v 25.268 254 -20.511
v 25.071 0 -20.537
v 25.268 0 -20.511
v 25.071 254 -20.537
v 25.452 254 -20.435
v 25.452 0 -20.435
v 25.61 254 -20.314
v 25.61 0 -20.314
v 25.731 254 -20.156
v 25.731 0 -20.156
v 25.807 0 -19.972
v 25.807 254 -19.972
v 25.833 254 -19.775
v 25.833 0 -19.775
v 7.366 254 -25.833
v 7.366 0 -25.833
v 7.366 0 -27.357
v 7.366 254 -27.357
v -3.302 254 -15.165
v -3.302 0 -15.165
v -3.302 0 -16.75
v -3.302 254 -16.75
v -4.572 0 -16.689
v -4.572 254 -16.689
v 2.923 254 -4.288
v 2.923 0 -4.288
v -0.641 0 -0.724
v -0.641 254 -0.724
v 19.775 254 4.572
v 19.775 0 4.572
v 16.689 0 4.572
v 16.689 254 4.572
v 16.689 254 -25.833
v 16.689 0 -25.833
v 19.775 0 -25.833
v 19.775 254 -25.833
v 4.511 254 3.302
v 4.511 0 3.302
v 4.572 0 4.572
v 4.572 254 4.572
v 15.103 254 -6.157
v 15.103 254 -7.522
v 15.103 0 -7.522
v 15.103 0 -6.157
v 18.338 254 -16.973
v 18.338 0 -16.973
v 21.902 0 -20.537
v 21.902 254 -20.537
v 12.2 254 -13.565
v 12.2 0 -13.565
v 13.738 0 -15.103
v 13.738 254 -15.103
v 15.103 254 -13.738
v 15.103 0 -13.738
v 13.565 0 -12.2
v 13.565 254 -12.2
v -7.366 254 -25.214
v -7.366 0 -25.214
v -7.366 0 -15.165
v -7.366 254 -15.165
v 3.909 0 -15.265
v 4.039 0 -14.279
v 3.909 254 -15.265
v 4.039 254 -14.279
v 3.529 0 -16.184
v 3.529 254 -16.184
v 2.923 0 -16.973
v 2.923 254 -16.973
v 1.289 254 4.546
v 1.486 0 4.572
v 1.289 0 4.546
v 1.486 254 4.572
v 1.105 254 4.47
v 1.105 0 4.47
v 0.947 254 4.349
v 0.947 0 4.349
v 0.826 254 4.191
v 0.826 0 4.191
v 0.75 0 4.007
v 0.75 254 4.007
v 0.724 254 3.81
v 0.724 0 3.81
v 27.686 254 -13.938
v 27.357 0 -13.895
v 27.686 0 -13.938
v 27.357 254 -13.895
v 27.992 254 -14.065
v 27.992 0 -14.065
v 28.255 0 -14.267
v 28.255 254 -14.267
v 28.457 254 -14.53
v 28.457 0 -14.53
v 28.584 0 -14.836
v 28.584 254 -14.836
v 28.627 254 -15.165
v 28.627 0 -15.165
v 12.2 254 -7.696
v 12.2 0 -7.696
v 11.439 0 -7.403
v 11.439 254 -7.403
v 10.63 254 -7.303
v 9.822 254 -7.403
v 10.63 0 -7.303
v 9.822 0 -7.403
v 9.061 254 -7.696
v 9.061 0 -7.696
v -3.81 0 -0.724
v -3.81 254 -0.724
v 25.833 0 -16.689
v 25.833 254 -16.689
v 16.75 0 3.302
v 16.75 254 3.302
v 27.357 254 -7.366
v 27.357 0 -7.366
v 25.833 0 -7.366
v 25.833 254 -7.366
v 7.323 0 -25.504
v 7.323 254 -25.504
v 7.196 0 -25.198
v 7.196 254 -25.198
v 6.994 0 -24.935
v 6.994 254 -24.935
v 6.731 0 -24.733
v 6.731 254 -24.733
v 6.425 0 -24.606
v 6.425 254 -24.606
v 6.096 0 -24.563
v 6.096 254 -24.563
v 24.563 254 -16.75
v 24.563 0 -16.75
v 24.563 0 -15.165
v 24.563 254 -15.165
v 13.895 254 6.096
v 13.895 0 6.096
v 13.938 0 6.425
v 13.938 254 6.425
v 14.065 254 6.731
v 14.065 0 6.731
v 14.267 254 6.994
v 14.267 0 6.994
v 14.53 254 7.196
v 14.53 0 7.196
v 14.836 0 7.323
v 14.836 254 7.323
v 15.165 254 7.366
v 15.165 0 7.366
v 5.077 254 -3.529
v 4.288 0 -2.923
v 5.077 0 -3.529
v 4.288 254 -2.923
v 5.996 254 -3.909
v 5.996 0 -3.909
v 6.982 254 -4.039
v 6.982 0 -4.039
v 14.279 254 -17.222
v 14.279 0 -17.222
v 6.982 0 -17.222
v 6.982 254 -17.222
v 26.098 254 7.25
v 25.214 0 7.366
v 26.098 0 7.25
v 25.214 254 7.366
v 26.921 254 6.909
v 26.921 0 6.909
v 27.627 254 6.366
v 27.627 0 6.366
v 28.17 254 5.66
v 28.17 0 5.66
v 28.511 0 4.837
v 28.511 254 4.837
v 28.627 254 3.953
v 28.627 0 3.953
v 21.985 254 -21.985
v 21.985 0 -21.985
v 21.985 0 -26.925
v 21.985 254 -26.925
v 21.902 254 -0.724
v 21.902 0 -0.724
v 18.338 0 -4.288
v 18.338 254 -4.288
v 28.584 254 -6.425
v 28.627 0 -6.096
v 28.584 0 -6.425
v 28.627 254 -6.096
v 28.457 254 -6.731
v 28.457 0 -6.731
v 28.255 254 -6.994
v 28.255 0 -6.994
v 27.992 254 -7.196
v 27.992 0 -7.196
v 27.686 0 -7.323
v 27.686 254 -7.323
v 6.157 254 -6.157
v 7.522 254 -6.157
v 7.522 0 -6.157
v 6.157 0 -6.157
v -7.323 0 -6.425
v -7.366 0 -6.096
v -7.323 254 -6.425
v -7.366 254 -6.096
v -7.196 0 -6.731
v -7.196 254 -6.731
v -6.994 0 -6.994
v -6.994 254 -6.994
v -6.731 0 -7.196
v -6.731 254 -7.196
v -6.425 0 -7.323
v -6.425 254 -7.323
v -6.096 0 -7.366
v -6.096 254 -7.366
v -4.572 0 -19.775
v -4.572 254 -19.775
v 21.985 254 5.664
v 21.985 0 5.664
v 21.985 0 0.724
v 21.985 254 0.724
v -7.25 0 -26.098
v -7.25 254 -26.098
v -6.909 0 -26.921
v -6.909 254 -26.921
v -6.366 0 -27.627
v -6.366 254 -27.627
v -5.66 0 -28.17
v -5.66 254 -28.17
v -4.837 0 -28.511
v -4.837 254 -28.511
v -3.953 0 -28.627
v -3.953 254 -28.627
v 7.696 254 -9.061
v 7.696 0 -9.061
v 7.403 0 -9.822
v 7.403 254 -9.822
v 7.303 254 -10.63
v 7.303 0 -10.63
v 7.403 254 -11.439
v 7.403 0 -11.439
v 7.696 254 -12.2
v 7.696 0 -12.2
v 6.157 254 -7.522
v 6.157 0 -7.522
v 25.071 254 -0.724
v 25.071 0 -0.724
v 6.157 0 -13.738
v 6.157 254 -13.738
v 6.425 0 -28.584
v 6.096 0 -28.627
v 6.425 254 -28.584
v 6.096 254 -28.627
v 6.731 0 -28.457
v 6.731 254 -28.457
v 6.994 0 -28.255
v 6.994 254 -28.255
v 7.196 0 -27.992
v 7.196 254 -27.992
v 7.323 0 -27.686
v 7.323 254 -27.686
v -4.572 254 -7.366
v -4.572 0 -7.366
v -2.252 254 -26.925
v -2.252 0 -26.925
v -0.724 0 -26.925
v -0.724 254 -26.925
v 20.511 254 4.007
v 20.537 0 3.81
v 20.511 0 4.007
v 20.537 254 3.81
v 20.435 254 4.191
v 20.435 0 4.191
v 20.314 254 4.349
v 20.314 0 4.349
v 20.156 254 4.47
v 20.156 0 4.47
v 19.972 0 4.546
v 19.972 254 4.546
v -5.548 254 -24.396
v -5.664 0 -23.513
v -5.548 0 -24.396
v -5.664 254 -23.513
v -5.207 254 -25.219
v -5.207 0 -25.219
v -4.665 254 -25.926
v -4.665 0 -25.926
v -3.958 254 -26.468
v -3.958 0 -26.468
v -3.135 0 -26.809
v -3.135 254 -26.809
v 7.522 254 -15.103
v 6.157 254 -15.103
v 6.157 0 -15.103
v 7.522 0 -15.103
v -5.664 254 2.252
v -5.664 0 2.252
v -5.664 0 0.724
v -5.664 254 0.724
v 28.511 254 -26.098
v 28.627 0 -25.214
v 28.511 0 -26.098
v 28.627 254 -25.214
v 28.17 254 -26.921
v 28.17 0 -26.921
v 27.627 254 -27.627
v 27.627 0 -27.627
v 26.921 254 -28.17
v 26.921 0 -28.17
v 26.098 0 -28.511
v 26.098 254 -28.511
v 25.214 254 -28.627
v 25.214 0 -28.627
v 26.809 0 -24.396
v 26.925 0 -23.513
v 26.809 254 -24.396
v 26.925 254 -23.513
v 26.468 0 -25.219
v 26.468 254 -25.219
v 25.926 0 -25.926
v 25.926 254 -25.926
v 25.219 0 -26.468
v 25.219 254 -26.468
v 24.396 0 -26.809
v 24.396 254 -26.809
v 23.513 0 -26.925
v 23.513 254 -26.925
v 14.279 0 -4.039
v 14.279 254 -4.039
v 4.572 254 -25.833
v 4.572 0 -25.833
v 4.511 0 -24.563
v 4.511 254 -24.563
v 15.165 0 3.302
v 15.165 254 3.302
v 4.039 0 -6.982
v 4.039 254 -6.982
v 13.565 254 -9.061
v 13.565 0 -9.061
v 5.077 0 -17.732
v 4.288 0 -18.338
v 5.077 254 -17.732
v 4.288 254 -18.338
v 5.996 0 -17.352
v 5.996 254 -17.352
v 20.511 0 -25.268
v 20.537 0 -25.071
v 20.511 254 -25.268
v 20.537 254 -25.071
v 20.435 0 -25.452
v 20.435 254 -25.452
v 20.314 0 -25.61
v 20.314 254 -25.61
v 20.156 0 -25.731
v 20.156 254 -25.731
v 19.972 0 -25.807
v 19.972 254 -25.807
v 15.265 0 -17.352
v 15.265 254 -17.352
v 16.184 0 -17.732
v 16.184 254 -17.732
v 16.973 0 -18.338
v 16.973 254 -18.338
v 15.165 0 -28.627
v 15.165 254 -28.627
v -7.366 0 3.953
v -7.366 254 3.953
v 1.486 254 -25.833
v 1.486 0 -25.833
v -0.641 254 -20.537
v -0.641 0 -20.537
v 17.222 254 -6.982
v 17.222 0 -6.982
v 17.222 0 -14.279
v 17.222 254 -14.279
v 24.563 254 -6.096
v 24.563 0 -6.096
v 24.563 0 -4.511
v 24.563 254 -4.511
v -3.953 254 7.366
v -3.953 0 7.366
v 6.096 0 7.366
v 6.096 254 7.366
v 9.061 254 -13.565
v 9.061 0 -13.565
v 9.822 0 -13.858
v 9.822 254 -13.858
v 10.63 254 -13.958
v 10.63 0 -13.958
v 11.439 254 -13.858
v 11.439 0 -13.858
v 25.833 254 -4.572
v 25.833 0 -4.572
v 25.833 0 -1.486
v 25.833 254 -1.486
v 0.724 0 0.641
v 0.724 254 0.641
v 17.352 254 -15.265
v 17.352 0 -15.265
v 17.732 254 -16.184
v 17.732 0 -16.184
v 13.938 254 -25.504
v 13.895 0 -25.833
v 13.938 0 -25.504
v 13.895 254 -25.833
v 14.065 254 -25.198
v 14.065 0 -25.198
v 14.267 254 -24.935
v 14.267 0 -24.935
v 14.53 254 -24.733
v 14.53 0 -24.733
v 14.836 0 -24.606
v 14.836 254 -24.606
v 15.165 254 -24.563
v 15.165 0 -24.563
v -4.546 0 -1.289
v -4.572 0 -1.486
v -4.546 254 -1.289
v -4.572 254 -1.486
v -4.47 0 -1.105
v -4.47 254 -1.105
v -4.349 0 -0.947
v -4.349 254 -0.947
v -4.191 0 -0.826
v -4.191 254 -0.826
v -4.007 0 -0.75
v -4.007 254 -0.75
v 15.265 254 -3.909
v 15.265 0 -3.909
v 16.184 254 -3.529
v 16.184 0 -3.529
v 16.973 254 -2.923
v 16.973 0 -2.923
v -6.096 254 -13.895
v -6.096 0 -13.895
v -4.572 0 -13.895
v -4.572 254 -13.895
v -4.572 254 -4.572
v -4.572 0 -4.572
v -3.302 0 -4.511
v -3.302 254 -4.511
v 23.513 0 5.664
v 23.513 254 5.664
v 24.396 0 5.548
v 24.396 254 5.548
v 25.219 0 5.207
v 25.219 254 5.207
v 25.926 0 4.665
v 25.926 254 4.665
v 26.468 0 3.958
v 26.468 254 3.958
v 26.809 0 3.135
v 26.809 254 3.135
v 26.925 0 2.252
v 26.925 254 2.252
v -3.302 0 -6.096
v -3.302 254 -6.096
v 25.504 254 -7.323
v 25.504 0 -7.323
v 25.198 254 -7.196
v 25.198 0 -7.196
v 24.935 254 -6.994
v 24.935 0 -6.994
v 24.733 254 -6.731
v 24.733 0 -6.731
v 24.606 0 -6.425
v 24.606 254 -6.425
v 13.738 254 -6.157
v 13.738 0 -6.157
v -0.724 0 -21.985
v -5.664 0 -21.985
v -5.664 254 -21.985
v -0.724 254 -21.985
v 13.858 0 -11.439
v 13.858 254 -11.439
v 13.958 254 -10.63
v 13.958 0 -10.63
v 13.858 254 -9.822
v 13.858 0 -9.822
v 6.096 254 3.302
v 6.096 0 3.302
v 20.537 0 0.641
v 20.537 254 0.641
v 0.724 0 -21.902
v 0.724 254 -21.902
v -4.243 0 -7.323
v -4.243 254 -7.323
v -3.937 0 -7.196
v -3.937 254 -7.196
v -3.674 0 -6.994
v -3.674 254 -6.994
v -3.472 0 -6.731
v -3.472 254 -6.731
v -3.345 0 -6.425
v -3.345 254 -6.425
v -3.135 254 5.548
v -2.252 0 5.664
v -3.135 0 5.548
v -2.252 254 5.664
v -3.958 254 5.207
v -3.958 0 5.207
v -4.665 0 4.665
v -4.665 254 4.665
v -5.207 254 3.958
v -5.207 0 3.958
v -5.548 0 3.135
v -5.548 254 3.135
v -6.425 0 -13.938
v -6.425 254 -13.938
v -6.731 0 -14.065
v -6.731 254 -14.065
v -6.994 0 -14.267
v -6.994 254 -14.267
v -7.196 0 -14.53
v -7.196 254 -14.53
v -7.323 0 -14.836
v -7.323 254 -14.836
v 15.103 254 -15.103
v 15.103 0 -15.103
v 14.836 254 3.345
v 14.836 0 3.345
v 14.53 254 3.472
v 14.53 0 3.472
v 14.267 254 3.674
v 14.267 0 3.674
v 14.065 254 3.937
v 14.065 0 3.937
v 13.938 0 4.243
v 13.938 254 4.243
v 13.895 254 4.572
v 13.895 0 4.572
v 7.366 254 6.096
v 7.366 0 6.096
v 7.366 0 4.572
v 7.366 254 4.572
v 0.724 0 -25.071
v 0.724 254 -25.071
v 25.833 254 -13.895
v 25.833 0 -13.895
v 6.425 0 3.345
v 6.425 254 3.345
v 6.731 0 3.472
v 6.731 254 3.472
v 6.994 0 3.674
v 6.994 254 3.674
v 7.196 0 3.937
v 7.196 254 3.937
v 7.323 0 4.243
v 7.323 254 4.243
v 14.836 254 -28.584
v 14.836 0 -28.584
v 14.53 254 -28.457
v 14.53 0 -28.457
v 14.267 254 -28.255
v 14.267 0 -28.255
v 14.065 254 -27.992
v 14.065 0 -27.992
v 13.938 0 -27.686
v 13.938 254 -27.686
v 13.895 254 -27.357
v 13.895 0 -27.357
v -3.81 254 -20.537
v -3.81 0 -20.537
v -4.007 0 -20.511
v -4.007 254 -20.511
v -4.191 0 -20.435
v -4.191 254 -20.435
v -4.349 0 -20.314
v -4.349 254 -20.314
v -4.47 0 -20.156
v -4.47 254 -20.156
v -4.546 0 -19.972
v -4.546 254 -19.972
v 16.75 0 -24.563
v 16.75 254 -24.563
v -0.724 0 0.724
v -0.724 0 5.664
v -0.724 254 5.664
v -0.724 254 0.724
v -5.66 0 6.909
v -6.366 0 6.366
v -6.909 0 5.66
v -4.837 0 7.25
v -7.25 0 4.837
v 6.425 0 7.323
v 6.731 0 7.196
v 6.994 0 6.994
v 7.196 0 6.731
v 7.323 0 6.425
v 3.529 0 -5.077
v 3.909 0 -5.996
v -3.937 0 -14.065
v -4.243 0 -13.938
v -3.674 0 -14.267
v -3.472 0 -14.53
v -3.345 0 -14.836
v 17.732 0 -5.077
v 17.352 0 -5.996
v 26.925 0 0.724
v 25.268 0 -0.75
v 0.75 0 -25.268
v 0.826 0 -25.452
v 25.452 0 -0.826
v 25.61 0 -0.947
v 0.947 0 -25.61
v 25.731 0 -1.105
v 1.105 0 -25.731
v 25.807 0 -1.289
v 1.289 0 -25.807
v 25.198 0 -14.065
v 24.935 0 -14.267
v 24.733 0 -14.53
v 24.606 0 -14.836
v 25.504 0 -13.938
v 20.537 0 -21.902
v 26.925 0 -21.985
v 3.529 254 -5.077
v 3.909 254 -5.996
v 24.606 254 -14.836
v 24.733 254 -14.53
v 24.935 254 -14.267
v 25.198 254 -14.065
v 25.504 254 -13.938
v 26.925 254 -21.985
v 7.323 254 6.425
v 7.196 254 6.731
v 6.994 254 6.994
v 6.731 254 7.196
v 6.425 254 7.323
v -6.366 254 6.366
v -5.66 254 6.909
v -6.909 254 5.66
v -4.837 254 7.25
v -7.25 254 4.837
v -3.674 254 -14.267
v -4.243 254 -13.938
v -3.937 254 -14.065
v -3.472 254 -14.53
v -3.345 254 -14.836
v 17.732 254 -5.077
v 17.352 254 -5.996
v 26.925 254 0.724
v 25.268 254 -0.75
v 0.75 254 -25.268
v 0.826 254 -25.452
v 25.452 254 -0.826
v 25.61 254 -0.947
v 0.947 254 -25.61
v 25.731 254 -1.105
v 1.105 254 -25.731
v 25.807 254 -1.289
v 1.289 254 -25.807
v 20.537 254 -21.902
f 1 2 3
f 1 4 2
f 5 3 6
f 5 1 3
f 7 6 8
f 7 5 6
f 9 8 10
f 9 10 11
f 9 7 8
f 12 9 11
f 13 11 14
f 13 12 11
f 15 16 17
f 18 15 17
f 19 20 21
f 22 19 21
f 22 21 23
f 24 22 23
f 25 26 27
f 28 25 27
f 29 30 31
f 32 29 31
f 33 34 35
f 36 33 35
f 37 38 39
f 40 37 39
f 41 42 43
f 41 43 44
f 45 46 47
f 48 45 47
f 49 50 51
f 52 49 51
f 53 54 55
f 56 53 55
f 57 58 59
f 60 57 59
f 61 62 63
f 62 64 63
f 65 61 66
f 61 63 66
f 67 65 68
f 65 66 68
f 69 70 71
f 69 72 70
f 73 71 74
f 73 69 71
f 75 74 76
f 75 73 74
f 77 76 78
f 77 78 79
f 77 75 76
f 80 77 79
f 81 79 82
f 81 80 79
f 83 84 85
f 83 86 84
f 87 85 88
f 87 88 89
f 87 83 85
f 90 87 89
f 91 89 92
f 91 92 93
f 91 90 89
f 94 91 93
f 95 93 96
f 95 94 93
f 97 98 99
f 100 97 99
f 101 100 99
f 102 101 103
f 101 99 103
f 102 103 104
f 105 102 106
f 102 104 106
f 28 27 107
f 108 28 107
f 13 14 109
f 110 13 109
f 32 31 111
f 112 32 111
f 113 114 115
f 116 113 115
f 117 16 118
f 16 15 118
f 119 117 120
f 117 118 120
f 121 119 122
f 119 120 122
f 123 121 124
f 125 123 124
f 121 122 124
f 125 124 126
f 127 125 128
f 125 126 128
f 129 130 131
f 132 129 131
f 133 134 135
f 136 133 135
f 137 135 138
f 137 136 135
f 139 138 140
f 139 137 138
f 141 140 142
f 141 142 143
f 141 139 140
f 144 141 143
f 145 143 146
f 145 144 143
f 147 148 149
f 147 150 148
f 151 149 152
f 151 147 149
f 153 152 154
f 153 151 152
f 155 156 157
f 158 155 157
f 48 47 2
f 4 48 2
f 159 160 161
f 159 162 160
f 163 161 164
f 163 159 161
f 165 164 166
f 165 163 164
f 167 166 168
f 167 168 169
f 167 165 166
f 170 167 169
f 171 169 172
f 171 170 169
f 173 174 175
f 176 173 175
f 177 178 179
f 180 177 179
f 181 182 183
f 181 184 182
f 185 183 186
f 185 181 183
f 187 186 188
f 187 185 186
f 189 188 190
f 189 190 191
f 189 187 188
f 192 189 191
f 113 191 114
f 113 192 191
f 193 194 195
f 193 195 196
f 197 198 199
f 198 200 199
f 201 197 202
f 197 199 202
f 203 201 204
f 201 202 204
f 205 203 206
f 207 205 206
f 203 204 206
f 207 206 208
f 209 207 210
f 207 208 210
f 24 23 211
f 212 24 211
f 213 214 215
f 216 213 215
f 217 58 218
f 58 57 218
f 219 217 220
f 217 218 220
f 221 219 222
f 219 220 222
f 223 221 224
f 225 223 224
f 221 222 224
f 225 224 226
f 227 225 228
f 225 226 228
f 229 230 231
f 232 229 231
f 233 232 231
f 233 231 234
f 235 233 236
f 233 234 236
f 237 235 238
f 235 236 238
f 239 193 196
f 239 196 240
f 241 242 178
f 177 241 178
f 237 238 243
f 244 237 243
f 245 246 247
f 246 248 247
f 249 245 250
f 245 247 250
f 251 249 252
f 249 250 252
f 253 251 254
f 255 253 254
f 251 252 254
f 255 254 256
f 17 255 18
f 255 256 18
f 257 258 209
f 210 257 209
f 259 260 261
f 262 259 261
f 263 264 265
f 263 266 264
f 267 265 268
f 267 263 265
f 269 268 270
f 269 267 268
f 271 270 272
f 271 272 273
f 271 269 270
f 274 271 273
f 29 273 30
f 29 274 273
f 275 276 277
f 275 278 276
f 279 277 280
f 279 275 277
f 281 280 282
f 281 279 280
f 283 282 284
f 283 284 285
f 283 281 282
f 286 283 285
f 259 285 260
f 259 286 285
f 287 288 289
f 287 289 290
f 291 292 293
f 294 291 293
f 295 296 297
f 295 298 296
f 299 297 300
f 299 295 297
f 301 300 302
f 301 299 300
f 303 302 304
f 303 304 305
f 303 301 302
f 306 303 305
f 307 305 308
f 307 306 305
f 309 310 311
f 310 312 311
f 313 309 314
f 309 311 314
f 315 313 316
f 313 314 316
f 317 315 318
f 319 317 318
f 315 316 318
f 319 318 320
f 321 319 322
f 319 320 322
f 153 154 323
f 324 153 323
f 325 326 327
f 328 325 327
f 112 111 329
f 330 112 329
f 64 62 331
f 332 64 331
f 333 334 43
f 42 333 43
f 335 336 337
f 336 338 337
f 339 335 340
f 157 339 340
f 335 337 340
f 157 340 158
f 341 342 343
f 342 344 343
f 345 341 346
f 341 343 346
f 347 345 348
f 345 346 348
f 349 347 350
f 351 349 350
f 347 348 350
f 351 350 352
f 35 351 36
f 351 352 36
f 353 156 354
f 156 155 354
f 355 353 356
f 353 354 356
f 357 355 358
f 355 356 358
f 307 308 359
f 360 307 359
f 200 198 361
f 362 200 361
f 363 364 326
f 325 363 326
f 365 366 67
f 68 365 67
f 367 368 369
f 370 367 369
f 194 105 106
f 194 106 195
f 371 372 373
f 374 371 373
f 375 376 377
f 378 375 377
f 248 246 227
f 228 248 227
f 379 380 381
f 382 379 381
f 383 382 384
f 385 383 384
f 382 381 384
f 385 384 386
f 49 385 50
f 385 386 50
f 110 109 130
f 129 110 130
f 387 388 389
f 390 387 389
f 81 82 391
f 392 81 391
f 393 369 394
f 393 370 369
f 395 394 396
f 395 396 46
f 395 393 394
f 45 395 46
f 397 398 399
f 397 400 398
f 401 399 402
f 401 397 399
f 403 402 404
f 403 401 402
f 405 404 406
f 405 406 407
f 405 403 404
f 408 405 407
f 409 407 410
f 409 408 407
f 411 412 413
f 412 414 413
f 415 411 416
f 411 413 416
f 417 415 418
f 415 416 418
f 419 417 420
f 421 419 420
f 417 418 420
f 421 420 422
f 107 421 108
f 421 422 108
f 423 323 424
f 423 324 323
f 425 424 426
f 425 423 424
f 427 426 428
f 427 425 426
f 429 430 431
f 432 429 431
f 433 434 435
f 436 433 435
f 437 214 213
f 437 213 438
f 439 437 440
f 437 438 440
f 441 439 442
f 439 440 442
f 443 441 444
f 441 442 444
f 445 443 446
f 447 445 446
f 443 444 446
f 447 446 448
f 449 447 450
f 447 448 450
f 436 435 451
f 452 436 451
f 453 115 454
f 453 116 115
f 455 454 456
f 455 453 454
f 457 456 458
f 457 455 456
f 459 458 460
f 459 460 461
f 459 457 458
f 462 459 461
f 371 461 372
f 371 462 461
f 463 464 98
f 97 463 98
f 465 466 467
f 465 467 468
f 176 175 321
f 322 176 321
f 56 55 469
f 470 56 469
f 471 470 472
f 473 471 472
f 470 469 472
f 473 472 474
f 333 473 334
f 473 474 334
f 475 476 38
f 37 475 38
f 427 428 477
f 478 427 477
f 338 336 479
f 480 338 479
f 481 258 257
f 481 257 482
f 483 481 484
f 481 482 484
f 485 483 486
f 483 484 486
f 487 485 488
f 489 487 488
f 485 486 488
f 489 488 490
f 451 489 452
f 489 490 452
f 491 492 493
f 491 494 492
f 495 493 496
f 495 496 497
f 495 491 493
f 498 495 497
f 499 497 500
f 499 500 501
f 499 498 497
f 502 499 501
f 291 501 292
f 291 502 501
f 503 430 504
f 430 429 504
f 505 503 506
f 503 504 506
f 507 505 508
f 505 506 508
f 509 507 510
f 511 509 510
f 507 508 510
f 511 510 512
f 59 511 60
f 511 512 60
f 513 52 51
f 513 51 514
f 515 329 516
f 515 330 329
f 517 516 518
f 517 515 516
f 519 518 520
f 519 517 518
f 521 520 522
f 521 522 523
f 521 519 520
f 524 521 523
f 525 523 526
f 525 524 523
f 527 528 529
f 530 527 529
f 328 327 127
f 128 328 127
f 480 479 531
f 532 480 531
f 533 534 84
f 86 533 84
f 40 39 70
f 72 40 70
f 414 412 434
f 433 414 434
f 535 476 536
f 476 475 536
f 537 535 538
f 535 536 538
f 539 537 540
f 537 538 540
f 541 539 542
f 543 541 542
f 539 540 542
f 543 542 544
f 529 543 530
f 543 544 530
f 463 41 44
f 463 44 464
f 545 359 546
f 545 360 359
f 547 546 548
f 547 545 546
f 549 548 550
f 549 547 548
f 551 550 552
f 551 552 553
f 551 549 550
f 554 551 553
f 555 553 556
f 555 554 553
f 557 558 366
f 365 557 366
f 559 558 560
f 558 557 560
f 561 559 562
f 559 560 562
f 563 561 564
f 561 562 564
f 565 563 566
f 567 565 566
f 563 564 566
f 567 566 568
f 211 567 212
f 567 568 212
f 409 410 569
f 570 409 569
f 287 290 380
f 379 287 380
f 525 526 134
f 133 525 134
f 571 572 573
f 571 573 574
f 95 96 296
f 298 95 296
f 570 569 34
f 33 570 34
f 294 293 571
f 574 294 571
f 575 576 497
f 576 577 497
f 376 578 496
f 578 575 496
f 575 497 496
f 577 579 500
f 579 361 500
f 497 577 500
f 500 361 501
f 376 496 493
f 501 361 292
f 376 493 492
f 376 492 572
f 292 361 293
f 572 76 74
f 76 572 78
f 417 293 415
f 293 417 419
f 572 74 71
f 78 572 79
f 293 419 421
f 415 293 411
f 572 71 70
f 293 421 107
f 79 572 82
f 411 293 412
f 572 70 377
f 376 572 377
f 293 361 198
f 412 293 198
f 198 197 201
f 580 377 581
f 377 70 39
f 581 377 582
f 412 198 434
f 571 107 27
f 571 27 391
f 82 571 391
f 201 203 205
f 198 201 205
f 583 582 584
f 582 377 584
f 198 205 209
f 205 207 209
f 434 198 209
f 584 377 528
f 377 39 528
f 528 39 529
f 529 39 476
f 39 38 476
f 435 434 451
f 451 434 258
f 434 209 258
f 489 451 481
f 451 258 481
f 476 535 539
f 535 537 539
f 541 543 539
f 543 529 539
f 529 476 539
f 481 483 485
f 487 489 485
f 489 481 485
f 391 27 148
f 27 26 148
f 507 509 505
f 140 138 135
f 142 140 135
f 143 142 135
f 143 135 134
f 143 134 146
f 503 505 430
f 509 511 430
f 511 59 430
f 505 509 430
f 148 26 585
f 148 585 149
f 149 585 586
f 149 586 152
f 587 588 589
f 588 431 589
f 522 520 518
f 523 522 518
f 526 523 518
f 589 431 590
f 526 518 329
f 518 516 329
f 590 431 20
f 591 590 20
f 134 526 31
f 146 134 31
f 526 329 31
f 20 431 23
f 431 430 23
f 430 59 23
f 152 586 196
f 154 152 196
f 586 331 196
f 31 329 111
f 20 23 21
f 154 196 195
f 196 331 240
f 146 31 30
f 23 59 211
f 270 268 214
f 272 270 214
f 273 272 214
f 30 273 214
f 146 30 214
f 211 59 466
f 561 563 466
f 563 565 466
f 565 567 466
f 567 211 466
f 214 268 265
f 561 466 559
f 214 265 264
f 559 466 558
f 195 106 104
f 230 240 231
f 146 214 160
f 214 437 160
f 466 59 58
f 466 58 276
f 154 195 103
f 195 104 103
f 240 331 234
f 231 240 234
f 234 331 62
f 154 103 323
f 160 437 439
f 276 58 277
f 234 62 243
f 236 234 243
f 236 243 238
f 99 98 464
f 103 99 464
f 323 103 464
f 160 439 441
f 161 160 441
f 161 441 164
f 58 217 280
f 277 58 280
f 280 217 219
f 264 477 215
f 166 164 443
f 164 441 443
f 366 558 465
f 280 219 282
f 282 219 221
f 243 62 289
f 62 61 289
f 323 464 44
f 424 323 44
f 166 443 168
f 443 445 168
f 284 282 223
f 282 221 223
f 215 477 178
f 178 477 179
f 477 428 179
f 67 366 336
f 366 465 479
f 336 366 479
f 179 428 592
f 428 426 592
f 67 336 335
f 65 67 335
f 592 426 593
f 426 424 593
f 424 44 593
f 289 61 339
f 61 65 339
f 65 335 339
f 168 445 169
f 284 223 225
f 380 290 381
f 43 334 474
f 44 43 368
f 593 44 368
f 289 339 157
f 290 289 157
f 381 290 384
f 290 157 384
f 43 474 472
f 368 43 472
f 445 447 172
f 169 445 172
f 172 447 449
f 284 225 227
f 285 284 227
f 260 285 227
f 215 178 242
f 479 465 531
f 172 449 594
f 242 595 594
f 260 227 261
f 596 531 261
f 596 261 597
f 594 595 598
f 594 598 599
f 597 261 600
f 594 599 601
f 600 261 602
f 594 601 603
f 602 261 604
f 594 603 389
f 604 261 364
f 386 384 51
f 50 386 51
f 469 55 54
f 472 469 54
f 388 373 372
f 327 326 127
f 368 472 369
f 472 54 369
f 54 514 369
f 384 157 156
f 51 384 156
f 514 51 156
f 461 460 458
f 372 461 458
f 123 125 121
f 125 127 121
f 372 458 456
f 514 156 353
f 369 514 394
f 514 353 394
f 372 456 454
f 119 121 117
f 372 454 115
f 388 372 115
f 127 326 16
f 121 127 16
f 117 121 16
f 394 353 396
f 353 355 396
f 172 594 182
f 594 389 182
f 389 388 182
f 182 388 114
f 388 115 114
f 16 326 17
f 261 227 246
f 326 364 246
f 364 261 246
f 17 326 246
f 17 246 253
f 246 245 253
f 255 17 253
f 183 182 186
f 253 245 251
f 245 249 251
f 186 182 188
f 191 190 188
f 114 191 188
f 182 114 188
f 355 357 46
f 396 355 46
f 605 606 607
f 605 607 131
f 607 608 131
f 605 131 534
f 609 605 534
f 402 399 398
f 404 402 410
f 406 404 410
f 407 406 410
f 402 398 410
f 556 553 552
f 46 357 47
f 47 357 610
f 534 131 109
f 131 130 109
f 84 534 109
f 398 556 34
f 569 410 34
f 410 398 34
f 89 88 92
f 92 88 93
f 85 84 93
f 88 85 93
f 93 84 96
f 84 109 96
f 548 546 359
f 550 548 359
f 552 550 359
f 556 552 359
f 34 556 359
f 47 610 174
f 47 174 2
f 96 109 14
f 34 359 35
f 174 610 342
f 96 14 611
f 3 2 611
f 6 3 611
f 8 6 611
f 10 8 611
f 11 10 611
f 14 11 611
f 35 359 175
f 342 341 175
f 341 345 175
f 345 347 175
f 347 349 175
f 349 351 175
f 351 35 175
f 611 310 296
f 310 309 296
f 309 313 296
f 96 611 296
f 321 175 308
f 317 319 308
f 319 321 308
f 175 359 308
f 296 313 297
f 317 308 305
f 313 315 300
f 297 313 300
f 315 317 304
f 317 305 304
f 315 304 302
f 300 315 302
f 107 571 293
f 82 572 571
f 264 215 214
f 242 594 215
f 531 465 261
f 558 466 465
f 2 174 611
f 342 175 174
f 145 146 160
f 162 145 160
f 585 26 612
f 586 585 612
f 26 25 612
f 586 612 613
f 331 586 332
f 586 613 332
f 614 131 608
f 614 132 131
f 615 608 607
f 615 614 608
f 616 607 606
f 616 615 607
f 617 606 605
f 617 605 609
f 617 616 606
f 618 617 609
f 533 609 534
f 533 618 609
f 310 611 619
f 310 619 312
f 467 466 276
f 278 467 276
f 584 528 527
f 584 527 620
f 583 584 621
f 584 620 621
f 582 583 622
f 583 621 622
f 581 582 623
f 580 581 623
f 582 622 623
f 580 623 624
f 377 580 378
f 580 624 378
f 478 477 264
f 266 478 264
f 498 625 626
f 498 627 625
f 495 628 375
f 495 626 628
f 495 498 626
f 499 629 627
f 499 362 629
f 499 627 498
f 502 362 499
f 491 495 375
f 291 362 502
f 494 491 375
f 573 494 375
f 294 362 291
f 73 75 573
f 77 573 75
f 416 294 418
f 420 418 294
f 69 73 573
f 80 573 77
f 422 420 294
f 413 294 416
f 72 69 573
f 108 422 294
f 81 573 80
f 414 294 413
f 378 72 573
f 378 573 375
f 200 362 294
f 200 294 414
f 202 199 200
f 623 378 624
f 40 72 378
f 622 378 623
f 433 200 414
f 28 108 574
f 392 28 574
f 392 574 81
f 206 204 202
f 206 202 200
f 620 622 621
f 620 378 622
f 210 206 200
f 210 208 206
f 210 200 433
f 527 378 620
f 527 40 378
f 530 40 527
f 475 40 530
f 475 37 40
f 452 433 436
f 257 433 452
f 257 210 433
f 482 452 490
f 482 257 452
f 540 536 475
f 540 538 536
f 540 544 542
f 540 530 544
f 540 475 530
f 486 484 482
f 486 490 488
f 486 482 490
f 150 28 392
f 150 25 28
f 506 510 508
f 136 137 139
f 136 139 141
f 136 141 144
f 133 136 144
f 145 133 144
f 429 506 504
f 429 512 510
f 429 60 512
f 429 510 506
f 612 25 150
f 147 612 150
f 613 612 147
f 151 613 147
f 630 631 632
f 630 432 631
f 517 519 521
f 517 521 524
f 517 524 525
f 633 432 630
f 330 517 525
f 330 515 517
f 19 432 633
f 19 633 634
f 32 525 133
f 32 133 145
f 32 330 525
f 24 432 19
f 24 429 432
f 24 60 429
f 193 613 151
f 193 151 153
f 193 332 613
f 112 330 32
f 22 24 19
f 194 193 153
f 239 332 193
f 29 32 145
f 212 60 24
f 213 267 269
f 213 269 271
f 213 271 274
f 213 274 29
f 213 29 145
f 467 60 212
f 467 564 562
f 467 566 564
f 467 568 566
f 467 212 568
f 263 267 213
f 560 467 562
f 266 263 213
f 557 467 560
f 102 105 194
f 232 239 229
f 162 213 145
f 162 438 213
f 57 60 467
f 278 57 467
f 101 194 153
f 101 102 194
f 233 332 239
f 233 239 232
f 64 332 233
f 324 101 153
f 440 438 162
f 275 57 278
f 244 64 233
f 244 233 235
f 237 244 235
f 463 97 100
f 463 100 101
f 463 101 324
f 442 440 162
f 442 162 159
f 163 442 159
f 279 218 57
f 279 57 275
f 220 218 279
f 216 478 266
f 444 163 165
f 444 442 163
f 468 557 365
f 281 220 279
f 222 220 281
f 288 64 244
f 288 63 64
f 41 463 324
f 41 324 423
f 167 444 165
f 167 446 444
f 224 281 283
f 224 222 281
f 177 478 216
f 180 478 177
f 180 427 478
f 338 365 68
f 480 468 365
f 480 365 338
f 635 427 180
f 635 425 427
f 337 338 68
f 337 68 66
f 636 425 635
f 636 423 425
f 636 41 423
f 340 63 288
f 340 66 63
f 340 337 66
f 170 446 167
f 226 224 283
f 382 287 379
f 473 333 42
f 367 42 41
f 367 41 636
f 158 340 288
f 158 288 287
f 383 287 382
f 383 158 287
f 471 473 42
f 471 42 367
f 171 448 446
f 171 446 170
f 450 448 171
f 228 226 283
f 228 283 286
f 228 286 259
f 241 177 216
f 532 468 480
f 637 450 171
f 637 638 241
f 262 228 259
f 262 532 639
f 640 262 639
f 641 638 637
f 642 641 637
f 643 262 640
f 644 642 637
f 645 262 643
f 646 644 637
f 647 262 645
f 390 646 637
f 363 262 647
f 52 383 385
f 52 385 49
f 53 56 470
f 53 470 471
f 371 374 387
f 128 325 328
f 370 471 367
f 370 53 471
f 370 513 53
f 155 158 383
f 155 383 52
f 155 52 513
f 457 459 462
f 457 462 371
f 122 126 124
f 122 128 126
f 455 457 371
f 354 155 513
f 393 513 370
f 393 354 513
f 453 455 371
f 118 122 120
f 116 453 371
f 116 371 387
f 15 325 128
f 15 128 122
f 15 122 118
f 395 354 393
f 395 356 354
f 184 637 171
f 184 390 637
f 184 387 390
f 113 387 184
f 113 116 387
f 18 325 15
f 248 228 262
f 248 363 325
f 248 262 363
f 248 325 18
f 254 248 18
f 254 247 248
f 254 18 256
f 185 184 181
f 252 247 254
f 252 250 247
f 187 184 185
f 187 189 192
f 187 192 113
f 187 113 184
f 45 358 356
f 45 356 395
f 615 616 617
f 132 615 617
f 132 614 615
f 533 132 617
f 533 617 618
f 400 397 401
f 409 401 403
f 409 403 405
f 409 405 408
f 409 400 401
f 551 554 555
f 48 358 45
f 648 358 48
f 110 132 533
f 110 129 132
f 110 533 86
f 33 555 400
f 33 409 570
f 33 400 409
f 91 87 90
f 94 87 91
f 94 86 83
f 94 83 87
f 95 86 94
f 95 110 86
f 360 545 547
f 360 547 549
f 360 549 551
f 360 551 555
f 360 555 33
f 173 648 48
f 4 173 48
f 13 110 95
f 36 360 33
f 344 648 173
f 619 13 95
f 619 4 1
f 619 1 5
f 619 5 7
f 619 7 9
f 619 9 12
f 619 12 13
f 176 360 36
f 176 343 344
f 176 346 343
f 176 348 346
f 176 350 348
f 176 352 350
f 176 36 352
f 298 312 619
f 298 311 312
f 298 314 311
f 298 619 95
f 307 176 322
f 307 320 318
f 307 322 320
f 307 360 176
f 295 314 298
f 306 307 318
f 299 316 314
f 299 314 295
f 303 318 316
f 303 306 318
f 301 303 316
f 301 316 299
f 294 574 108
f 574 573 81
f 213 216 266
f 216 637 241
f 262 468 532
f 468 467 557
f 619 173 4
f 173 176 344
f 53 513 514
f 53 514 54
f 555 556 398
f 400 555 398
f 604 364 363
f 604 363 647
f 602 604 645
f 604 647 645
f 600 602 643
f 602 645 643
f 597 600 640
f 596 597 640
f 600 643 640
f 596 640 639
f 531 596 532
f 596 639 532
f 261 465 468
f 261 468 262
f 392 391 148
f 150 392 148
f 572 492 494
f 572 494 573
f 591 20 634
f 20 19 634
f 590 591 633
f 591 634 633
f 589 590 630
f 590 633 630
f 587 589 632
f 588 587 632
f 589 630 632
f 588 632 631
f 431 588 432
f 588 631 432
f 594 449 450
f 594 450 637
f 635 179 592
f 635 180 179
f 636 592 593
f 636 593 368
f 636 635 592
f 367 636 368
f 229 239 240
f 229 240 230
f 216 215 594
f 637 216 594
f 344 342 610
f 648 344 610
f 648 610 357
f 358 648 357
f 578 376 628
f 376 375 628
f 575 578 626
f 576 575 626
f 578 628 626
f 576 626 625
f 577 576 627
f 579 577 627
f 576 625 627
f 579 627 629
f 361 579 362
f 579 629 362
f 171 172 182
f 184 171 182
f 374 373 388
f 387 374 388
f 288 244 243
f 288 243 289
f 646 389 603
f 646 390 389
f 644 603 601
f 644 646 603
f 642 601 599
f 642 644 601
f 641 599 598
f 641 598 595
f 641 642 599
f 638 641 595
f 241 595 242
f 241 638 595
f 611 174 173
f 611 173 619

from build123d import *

# Parameters (mm, degrees)
SKETCH1_W           = 4.9403
SKETCH1_H           = 4.9403
BOSS_EXTRUDE6_DEPTH = 254
FILLET1_R           = 3.4125154
FILLET2_R           = 0.762
FILLET3_R           = 1.27
FILLET4_R           = 3.81


with BuildPart() as part:
    # Sketch1 → Boss-Extrude6 (new body)
    with BuildSketch(Plane(origin=(0, 0, 0), x_dir=(1, 0, 0), z_dir=(0, 1, 0))):
        Polygon((-7.366, -7.366), (7.366, -7.366), (7.366, -3.302), (4.510882512, -3.302), (4.572, -4.572), (0.7239, -4.572), (0.7239, -0.64109893), (5.404132197, 4.039133267), (15.856734336, 4.039133267), (20.536966533, -0.64109893), (20.536966533, -4.572), (16.688866533, -4.572), (16.749984021, -3.302), (13.894866533, -3.302), (13.894866533, -7.366), (28.626866533, -7.366), (28.626866533, 7.366), (24.562866533, 7.366), (24.562866533, 4.510882512), (25.832866533, 4.572), (25.832866533, 0.7239), (21.901965464, 0.7239), (17.221733267, 5.404132197), (17.221733267, 15.856734336), (21.901965464, 20.536966533), (25.832866533, 20.536966533), (25.832866533, 16.688866533), (24.562866533, 16.749984021), (24.562866533, 13.894866533), (28.626866533, 13.894866533), (28.626866533, 28.626866533), (13.894866533, 28.626866533), (13.894866533, 24.562866533), (16.749984021, 24.562866533), (16.688866533, 25.832866533), (20.536966533, 25.832866533), (20.536966533, 21.901965464), (15.856734336, 17.221733267), (5.404132197, 17.221733267), (0.7239, 21.901965464), (0.7239, 25.832866533), (4.572, 25.832866533), (4.510882512, 24.562866533), (7.366, 24.562866533), (7.366, 28.626866533), (-7.366, 28.626866533), (-7.366, 13.894866533), (-3.302, 13.894866533), (-3.302, 16.749984021), (-4.572, 16.688866533), (-4.572, 20.536966533), (-0.64109893, 20.536966533), (4.039133267, 15.856734336), (4.039133267, 5.404132197), (-0.64109893, 0.7239), (-4.572, 0.7239), (-4.572, 4.572), (-3.302, 4.510882512), (-3.302, 7.366), (-7.366, 7.366), align=None)
        with Locations((-3.19405, -3.19405)):
            Rectangle(SKETCH1_W, SKETCH1_H, mode=Mode.SUBTRACT)
        with Locations((-3.19405, 24.454916533)):
            Rectangle(SKETCH1_W, SKETCH1_H, mode=Mode.SUBTRACT)
        with Locations((24.454916533, 24.454916533)):
            Rectangle(SKETCH1_W, SKETCH1_H, mode=Mode.SUBTRACT)
        with Locations((24.454916533, -3.19405)):
            Rectangle(SKETCH1_W, SKETCH1_H, mode=Mode.SUBTRACT)
        with BuildLine():
            Line((7.696270003, 12.1995976), (6.157493267, 13.738374336))
            Line((6.157493267, 13.738374336), (6.157493267, 15.103373267))
            Line((6.157493267, 15.103373267), (7.522492197, 15.103373267))
            Line((7.522492197, 15.103373267), (9.061268934, 13.56459653))
            ThreePointArc((9.061268934, 13.56459653), (10.630433267, 13.957833267), (12.1995976, 13.56459653))
            Line((12.1995976, 13.56459653), (13.738374336, 15.103373267))
            Line((13.738374336, 15.103373267), (15.103373267, 15.103373267))
            Line((15.103373267, 15.103373267), (15.103373267, 13.738374336))
            Line((15.103373267, 13.738374336), (13.56459653, 12.1995976))
            ThreePointArc((13.56459653, 12.1995976), (13.957833267, 10.630433267), (13.56459653, 9.061268934))
            Line((13.56459653, 9.061268934), (15.103373267, 7.522492197))
            Line((15.103373267, 7.522492197), (15.103373267, 6.157493267))
            Line((15.103373267, 6.157493267), (13.738374336, 6.157493267))
            Line((13.738374336, 6.157493267), (12.1995976, 7.696270003))
            ThreePointArc((12.1995976, 7.696270003), (10.630433267, 7.303033267), (9.061268934, 7.696270003))
            Line((9.061268934, 7.696270003), (7.522492197, 6.157493267))
            Line((7.522492197, 6.157493267), (6.157493267, 6.157493267))
            Line((6.157493267, 6.157493267), (6.157493267, 7.522492197))
            Line((6.157493267, 7.522492197), (7.696270003, 9.061268934))
            ThreePointArc((7.696270003, 9.061268934), (7.303033267, 10.630433267), (7.696270003, 12.1995976))
        make_face(mode=Mode.SUBTRACT)
    extrude(amount=BOSS_EXTRUDE6_DEPTH)

    # Fillet1
    fillet1_edges = [part.edges().sort_by_distance(p)[0] for p in [
        (-7.366, 127, 7.366),
        (-7.366, 127, -28.626866533),
        (28.626866533, 127, -28.626866533),
        (28.626866533, 127, 7.366),
        (26.925066533, 127, 5.6642),
        (26.925066533, 127, -26.925066533),
        (-5.6642, 127, -26.925066533),
        (-5.6642, 127, 5.6642),
    ]]
    fillet(fillet1_edges, radius=FILLET1_R)

    # Fillet2
    fillet2_edges = [part.edges().sort_by_distance(p)[0] for p in [
        (0.7239, 127, 4.572),
        (-4.572, 127, -0.7239),
        (-4.572, 127, -20.536966533),
        (0.7239, 127, -25.832866533),
        (20.536966533, 127, -25.832866533),
        (25.832866533, 127, -20.536966533),
        (25.832866533, 127, -0.7239),
        (20.536966533, 127, 4.572),
    ]]
    fillet(fillet2_edges, radius=FILLET2_R)

    # Fillet3
    fillet3_edges = [part.edges().sort_by_distance(p)[0] for p in [
        (7.366, 127, 3.302),
        (7.366, 127, 7.366),
        (-7.366, 127, -7.366),
        (-3.302, 127, -7.366),
        (-3.302, 127, -13.894866533),
        (-7.366, 127, -13.894866533),
        (7.366, 127, -28.626866533),
        (7.366, 127, -24.562866533),
        (13.894866533, 127, -24.562866533),
        (13.894866533, 127, -28.626866533),
        (28.626866533, 127, -13.894866533),
        (24.562866533, 127, -13.894866533),
        (24.562866533, 127, -7.366),
        (28.626866533, 127, -7.366),
        (13.894866533, 127, 7.366),
        (13.894866533, 127, 3.302),
    ]]
    fillet(fillet3_edges, radius=FILLET3_R)

    # Fillet4
    fillet4_edges = [part.edges().sort_by_distance(p)[0] for p in [
        (4.039133267, 127, -5.404132197),
        (4.039133267, 127, -15.856734336),
        (5.404132197, 127, -17.221733267),
        (15.856734336, 127, -17.221733267),
        (17.221733267, 127, -15.856734336),
        (17.221733267, 127, -5.404132197),
        (15.856734336, 127, -4.039133267),
        (5.404132197, 127, -4.039133267),
    ]]
    fillet(fillet4_edges, radius=FILLET4_R)


solid = part.part
